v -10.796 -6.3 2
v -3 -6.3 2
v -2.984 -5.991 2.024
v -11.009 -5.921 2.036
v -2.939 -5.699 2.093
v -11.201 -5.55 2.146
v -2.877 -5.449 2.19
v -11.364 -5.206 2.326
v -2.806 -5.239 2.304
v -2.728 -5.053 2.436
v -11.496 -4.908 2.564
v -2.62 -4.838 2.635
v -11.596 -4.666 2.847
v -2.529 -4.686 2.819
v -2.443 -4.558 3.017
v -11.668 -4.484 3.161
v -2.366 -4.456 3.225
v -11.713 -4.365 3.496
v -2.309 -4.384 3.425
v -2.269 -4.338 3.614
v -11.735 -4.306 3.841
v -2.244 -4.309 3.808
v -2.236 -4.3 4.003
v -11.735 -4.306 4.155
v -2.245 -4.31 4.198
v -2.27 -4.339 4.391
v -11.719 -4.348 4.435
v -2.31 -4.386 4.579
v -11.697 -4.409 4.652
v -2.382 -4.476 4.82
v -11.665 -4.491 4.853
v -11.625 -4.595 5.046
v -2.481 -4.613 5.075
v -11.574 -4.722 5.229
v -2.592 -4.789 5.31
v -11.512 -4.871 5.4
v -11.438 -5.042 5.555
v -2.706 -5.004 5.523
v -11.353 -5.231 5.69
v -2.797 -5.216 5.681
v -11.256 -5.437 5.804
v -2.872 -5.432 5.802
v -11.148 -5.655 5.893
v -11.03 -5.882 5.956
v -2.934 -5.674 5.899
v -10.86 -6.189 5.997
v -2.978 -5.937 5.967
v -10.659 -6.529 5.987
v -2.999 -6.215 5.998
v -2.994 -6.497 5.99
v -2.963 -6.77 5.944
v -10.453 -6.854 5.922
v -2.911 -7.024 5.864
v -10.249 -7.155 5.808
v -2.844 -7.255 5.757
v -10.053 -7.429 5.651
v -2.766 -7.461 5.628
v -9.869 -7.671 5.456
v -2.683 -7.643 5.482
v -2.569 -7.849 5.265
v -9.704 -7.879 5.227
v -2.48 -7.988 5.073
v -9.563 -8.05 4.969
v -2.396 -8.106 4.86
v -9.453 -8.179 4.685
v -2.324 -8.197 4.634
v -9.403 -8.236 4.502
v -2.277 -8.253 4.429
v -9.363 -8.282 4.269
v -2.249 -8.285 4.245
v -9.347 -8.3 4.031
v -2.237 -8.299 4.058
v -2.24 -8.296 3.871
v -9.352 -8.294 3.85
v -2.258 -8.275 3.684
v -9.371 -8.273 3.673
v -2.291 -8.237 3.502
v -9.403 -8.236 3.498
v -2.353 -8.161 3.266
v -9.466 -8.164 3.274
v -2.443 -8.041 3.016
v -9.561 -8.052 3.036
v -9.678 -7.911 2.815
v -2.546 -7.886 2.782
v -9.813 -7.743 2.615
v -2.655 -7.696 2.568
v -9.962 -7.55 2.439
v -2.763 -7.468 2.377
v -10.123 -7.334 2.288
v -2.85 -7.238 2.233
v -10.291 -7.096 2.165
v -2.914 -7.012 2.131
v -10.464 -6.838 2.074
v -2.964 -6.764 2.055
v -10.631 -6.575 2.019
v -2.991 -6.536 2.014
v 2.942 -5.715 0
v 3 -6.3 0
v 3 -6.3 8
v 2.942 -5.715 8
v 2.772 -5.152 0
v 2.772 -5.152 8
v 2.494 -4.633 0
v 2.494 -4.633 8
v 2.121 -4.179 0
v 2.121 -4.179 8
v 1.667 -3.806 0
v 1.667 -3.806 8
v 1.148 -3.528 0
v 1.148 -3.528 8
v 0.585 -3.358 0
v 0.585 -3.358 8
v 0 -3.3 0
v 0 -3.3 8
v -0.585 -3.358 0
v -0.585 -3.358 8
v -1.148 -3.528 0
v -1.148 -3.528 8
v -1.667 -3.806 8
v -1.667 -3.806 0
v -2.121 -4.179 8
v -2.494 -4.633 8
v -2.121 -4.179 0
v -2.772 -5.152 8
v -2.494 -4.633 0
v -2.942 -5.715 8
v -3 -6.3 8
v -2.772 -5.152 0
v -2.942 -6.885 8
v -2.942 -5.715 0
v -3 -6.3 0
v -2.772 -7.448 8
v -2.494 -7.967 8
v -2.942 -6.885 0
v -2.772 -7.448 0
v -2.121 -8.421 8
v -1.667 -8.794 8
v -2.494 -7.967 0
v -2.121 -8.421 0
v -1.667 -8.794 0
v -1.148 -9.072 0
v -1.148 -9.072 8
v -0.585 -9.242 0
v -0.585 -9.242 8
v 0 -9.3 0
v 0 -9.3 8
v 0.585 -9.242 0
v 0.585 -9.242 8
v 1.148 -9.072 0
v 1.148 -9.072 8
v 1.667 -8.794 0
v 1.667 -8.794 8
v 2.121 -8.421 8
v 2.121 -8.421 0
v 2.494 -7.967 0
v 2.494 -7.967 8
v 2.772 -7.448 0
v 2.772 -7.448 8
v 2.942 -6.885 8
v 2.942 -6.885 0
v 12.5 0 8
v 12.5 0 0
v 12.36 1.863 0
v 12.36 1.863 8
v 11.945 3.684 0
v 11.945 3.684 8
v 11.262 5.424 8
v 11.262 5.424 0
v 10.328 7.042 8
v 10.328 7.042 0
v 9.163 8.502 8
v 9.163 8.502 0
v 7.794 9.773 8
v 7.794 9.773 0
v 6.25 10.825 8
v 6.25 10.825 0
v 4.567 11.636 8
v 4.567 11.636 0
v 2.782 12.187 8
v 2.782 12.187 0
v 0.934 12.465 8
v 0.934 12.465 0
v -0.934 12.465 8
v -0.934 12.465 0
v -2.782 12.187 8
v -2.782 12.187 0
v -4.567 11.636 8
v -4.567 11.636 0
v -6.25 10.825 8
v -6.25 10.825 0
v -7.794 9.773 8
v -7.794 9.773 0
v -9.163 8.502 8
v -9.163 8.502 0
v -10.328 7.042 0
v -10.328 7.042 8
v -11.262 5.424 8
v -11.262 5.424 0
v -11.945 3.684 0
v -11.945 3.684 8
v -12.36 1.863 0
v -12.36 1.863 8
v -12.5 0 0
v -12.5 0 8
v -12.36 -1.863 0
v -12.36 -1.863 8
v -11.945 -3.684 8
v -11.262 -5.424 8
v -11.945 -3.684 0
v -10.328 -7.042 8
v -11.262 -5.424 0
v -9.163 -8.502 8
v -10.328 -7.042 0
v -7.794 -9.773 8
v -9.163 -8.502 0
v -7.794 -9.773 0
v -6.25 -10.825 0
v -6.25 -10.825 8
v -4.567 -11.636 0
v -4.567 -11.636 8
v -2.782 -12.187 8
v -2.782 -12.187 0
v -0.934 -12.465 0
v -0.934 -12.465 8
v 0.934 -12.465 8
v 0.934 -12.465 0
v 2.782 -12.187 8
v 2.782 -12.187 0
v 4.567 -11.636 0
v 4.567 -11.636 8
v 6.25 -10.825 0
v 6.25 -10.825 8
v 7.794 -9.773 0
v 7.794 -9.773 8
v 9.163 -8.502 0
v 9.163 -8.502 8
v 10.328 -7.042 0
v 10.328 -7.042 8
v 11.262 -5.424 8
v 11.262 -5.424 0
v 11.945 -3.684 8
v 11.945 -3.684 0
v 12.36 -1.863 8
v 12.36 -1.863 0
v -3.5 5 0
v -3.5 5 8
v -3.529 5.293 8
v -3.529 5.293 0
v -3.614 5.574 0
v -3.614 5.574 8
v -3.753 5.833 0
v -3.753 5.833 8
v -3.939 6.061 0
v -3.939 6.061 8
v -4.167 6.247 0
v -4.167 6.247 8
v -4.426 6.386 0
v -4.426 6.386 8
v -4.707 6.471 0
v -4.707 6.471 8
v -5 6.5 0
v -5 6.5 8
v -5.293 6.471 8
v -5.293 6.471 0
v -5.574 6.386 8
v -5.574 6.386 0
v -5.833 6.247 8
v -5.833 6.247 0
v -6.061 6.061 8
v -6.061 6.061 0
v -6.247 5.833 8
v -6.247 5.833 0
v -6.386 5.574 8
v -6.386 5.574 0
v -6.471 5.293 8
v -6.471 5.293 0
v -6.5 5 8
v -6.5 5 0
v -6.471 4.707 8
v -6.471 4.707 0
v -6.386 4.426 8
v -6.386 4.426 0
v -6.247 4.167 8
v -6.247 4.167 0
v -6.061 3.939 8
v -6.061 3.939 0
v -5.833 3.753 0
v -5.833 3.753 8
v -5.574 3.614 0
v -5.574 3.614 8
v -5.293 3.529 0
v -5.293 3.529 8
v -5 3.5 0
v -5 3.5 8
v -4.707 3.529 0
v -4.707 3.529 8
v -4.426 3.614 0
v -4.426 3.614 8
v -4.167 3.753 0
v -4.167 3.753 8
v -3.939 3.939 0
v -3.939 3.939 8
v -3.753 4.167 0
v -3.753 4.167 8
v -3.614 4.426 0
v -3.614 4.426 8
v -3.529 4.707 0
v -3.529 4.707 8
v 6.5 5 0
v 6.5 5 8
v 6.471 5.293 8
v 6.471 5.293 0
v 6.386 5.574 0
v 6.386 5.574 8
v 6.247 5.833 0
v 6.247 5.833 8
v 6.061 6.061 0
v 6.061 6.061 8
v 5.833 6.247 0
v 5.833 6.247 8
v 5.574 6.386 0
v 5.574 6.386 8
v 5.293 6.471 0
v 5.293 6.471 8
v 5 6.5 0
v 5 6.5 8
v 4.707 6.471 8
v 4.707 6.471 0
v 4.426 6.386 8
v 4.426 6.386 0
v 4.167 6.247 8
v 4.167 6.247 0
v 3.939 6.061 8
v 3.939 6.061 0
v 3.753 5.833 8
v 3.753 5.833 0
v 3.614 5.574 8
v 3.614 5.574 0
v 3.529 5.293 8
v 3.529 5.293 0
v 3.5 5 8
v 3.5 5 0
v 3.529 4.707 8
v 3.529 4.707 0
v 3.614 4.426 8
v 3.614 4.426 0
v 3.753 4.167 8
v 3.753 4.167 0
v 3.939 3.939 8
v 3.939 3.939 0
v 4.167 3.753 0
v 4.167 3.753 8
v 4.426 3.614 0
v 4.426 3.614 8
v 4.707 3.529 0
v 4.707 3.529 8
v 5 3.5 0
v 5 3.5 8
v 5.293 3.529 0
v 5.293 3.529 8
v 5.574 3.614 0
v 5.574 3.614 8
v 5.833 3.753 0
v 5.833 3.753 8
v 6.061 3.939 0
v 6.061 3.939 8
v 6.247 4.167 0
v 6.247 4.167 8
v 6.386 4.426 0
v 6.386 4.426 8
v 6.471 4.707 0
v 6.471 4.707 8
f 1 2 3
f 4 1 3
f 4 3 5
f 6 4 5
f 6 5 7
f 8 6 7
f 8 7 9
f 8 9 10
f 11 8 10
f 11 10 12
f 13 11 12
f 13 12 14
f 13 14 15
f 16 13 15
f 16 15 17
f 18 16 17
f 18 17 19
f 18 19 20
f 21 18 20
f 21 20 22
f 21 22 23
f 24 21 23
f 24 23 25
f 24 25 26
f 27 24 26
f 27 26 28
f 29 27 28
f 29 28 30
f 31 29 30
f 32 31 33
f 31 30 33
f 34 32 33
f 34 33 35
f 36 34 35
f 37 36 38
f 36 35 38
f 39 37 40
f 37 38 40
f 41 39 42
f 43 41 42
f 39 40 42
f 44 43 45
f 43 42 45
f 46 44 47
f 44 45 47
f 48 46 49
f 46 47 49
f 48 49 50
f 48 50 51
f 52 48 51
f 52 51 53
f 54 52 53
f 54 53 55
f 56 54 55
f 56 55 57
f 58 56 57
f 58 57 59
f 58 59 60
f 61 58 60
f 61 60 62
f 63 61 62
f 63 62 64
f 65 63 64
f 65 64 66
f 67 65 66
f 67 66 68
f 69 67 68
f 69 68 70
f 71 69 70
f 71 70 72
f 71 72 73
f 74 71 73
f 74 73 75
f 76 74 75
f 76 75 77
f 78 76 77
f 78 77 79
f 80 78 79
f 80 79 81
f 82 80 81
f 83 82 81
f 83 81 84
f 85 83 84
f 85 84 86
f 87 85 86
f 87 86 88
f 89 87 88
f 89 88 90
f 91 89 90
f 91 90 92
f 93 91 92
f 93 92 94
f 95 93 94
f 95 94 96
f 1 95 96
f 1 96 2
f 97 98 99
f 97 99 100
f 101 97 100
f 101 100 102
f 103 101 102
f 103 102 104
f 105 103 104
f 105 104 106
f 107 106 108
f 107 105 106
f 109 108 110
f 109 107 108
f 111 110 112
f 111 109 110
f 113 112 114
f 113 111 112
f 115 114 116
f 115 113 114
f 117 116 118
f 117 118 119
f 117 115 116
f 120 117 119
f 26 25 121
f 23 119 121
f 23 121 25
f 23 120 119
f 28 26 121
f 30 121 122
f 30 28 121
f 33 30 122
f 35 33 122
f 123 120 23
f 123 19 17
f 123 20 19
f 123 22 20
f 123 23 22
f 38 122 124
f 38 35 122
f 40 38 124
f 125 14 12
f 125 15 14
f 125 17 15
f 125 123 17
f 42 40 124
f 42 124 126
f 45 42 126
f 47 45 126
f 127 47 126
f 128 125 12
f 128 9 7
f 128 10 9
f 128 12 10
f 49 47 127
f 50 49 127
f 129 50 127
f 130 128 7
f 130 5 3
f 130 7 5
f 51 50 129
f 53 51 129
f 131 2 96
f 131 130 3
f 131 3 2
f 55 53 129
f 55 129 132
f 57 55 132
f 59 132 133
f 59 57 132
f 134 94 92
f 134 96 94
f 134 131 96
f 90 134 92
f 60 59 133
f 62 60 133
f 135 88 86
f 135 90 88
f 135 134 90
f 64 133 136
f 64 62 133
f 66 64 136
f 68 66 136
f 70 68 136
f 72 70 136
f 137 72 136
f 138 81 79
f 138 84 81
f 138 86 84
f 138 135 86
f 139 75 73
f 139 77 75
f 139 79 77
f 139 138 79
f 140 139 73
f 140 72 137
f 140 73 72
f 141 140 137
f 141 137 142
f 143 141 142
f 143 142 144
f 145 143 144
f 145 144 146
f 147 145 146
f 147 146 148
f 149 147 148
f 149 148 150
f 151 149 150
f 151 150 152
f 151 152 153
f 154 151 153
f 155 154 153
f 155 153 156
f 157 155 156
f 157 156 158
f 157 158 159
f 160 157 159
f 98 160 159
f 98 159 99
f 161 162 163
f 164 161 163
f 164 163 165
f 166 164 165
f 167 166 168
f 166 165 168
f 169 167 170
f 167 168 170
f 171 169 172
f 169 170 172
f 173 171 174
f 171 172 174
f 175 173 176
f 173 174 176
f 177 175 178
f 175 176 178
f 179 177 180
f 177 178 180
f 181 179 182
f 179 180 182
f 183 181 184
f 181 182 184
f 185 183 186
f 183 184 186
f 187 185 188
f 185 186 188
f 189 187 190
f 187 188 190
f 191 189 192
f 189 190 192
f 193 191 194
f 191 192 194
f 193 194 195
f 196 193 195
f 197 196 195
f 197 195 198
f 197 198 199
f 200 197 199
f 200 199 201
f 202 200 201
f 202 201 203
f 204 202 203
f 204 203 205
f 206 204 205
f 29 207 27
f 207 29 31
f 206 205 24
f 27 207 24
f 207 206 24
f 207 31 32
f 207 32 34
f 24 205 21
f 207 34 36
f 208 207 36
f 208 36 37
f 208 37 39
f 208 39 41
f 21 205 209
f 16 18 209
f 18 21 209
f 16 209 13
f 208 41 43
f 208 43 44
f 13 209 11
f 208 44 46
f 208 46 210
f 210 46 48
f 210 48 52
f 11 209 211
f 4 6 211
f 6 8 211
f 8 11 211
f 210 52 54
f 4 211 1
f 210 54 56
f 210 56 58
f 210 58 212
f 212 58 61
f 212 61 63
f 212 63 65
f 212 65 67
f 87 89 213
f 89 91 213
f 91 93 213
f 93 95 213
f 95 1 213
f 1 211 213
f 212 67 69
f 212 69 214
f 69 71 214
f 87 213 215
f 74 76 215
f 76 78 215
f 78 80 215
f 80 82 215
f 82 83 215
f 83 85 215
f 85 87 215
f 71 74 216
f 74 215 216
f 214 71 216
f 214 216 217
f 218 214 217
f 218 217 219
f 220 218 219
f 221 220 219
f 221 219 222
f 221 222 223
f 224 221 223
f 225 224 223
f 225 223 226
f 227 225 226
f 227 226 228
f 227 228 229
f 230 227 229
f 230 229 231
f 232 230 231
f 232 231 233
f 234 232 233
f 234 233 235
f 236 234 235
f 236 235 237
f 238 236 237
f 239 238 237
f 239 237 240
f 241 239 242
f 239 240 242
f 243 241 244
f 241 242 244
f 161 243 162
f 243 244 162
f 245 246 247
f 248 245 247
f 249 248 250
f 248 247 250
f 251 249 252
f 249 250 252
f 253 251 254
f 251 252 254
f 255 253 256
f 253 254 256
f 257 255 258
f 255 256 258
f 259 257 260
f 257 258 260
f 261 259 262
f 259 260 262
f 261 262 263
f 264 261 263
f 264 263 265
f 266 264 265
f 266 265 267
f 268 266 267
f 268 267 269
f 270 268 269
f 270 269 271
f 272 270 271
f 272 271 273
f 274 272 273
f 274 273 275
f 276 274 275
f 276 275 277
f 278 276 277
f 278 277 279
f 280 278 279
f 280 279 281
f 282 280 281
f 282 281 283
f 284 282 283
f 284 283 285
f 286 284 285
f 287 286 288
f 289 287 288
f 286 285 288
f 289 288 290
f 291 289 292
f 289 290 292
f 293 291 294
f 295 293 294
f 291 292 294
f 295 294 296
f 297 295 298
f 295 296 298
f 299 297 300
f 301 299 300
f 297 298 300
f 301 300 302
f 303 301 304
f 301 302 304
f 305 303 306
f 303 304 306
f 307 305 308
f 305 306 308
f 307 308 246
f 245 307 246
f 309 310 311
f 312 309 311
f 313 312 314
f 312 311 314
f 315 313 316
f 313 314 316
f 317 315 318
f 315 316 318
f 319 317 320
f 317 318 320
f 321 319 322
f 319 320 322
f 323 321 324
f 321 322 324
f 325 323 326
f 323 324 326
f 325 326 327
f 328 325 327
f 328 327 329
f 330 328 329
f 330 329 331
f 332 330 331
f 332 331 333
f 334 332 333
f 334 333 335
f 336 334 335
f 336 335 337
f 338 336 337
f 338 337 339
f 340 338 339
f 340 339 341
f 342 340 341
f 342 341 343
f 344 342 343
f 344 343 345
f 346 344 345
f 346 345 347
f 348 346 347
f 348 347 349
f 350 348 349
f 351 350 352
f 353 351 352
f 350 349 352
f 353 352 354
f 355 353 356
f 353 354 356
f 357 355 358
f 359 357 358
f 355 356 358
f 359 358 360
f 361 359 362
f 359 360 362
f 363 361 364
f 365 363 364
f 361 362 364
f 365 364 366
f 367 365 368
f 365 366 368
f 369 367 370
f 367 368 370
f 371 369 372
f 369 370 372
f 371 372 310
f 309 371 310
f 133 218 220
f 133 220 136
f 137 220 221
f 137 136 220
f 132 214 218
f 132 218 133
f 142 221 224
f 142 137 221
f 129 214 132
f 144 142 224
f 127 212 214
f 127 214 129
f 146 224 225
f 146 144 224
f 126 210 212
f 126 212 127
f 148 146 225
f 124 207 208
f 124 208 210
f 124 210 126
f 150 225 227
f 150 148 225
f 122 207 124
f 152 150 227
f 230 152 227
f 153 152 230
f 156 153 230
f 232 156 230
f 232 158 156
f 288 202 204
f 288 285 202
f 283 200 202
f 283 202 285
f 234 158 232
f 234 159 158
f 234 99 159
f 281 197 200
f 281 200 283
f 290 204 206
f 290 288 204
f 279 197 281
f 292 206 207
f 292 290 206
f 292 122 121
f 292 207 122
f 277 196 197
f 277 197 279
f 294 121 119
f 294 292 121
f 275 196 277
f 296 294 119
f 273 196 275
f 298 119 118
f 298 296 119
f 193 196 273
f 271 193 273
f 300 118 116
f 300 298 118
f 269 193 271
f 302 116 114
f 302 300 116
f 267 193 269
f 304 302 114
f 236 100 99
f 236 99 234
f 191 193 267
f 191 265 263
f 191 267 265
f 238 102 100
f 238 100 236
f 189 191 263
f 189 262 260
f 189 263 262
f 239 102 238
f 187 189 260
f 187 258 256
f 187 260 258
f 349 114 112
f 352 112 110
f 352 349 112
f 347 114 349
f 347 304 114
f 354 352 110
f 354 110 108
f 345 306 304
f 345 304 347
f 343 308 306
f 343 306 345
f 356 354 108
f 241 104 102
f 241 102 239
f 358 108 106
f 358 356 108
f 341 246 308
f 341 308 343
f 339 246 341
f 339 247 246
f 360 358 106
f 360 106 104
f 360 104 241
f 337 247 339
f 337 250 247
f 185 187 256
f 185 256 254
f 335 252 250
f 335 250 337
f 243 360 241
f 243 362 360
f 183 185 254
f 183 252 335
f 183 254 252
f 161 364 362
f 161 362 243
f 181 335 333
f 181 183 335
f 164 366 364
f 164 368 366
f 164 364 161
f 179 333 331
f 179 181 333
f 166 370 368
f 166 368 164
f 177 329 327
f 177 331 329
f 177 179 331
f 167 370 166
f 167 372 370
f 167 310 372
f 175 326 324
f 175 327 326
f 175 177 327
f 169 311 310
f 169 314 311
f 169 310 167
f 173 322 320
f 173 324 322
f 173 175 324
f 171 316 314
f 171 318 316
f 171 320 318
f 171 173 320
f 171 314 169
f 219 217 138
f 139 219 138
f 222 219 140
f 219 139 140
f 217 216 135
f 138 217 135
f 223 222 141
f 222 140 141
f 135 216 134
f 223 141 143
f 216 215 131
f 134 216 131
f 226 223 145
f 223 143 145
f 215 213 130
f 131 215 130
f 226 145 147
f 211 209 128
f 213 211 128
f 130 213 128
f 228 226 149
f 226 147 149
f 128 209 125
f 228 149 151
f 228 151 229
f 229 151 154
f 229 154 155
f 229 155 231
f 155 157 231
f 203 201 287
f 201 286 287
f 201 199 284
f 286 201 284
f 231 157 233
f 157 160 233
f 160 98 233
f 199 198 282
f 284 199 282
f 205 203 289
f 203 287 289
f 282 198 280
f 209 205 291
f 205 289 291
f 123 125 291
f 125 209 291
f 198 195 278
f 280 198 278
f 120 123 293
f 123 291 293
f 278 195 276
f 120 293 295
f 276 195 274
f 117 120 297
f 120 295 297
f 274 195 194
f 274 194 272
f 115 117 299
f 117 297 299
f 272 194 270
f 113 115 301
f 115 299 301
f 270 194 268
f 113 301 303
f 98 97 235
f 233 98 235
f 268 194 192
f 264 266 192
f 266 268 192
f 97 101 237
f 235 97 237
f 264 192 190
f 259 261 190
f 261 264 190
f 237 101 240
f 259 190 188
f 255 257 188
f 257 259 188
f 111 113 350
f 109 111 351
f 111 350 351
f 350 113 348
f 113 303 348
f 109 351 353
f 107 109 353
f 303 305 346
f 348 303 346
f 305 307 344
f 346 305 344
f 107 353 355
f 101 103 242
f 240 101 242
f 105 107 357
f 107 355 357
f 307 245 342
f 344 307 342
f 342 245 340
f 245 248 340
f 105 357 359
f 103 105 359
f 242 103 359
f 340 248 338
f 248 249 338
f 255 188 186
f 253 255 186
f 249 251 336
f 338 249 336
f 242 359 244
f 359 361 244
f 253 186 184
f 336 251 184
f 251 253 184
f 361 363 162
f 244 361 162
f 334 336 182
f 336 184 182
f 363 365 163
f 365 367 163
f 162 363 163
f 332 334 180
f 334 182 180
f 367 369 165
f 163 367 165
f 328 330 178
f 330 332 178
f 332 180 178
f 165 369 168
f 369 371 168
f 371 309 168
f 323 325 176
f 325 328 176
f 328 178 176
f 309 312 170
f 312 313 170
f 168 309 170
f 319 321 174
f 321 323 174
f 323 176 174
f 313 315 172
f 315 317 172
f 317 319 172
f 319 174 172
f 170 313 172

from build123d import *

# Parameters (mm, degrees)
SKETCH_1_R          = 12.5
SKETCH_1_R_2        = 3
EXTRUDE_1_DEPTH     = 8
SKETCH_2_R          = 2
CUT_EXTRUDE_1_DEPTH = 13.5
SKETCH_3_R          = 1.5
CUT_EXTRUDE_2_DEPTH = 9.0000001


with BuildPart() as part:
    # 草图1 → 凸台-拉伸1 (new body)
    with BuildSketch(Plane.XY):
        Circle(SKETCH_1_R)
        with Locations((0, -6.3)):
            Circle(SKETCH_1_R_2, mode=Mode.SUBTRACT)
    extrude(amount=EXTRUDE_1_DEPTH)

    # 草图2 → 切除-拉伸1 (cut, through all)
    with BuildSketch(Plane(origin=(0, 0, 0), x_dir=(0, 0, -1), z_dir=(1, 0, 0))):
        with Locations((-4, -6.3)):
            Circle(SKETCH_2_R)
    extrude(amount=-CUT_EXTRUDE_1_DEPTH, mode=Mode.SUBTRACT)

    # 草图3 → 切除-拉伸2 (cut, through all)
    with BuildSketch(Plane.XY.offset(8)):
        with Locations((-5, 5)):
            Circle(SKETCH_3_R)
        with Locations((5, 5)):
            Circle(SKETCH_3_R)
    extrude(amount=-CUT_EXTRUDE_2_DEPTH, mode=Mode.SUBTRACT)


solid = part.part
